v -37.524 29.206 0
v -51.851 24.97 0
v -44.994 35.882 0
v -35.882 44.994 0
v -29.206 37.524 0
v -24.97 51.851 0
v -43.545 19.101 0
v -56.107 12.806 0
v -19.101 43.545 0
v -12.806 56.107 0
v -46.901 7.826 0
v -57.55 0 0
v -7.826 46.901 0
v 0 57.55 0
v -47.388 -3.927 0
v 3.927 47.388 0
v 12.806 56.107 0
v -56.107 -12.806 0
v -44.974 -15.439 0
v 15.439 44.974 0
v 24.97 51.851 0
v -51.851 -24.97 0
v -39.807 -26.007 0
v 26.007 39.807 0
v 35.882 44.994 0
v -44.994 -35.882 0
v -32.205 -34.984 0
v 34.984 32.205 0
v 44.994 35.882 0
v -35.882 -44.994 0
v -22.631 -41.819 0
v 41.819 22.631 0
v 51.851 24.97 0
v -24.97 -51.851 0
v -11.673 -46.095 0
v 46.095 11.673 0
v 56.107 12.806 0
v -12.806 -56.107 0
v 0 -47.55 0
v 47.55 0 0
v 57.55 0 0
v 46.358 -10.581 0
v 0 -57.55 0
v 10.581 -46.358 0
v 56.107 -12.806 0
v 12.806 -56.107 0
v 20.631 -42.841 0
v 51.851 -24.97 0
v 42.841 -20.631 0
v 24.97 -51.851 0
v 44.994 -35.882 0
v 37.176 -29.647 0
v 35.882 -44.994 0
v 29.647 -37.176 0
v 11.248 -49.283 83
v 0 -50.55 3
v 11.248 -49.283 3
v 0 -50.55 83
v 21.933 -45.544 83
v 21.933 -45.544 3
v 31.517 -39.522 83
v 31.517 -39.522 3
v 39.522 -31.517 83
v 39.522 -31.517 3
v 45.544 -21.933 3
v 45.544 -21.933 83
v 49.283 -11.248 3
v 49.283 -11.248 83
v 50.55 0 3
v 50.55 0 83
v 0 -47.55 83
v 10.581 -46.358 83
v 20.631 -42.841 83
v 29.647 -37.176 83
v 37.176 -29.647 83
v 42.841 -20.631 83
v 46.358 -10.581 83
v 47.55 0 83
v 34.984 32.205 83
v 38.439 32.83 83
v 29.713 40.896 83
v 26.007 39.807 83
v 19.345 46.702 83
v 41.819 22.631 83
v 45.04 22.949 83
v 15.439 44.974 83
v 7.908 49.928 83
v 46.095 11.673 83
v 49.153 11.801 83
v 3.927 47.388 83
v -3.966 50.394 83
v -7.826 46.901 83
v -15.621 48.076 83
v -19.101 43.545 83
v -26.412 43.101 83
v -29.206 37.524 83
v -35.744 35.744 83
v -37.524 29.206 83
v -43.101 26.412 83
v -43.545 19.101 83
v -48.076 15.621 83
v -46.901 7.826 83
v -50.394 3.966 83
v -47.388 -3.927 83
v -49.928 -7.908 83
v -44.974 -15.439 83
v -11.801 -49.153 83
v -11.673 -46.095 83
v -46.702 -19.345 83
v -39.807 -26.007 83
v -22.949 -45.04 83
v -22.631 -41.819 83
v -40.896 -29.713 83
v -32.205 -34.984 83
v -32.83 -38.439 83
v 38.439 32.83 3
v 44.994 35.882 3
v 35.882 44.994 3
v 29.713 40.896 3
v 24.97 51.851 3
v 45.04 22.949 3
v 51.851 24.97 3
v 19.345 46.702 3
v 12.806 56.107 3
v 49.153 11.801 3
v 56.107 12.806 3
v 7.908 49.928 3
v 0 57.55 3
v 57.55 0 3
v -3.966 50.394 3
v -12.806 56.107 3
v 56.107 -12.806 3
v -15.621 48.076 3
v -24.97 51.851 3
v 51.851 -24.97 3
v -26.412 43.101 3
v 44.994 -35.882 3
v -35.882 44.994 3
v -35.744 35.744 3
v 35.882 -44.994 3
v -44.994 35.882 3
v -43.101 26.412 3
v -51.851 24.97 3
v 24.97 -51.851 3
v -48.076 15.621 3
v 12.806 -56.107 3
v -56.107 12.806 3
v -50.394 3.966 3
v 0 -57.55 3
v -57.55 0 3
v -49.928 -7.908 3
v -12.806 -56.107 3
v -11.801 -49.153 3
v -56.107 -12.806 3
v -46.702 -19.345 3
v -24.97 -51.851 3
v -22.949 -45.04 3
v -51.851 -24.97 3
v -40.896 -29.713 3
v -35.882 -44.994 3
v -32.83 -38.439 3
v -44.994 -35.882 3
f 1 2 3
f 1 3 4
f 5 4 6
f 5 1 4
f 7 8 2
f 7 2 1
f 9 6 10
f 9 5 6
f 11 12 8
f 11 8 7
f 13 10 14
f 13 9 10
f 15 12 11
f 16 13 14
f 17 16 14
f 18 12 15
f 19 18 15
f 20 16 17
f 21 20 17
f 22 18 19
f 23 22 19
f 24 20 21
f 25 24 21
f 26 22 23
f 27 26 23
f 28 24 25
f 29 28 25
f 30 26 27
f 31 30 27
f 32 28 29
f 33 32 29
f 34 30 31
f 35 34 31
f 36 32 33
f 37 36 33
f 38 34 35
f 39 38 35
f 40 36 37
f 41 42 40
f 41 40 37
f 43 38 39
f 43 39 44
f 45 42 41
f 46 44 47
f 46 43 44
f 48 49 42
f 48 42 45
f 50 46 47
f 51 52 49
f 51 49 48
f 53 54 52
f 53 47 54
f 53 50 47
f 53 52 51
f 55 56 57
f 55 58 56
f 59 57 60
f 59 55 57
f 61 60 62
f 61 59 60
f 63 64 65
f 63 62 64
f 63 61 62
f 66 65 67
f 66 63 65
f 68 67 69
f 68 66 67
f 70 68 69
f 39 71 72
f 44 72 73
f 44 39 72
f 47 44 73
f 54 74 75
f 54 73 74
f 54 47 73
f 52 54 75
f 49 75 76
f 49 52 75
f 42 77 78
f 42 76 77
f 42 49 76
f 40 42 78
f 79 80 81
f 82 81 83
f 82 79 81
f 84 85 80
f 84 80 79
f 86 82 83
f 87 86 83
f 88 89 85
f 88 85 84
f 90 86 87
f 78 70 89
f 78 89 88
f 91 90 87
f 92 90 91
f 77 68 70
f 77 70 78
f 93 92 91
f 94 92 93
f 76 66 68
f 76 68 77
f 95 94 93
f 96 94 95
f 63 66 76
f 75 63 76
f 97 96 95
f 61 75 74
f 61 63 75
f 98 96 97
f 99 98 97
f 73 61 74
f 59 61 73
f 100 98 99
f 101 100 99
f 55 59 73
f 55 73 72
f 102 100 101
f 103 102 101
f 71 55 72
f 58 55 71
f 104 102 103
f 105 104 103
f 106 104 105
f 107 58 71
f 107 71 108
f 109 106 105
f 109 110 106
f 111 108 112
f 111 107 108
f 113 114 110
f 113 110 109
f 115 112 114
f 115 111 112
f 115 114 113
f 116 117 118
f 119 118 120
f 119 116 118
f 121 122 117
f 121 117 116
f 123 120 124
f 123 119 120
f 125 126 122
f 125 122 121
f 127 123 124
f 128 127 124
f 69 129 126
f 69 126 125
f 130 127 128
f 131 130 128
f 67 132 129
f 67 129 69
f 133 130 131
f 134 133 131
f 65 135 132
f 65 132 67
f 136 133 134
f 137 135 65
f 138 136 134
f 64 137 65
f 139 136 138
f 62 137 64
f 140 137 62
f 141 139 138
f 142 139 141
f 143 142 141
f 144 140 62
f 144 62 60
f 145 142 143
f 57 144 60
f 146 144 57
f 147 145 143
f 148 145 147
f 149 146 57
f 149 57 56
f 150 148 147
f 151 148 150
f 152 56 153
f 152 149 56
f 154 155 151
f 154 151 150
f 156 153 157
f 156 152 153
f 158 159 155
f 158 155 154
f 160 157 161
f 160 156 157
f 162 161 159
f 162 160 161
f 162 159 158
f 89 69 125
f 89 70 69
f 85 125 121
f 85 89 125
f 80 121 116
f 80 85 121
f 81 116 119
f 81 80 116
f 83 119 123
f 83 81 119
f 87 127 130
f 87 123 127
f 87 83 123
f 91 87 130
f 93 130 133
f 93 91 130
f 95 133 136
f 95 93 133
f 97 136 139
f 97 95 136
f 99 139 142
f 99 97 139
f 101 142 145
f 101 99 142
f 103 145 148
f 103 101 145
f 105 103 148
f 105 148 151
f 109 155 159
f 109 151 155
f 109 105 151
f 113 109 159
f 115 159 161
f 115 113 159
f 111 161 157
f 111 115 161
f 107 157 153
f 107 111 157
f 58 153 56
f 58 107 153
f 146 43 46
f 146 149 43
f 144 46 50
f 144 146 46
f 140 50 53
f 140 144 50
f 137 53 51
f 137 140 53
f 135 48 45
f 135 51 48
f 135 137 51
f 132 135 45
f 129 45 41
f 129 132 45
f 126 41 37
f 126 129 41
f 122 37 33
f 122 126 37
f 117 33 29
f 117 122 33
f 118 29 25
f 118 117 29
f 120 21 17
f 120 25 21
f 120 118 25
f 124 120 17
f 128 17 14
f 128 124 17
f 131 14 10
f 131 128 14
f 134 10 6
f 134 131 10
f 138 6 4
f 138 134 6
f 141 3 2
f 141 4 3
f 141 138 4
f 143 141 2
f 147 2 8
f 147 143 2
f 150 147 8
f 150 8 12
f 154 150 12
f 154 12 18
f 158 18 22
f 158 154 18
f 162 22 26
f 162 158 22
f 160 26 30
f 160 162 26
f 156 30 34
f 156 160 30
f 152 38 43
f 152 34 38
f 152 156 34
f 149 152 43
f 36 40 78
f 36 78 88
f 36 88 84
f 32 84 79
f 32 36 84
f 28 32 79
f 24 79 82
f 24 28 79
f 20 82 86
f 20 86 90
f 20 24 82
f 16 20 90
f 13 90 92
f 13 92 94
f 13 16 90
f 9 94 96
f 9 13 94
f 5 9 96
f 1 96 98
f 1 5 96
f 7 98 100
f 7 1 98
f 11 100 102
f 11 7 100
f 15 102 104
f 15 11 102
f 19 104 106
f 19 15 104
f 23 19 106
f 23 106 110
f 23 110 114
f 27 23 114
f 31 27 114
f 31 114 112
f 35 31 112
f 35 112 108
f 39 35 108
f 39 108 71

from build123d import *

# Parameters (mm, degrees)
REVOLUTION_ANGLE            = 90
REVOLUTION_MIRRORED_2_ANGLE = -90


with BuildPart() as part:
    # Sketch → Revolution (revolve)
    with BuildSketch(Plane.XZ):
        Polygon((47.55, 0), (50.55, 0), (57.55, 0), (57.55, 3), (50.55, 3), (50.55, 83), (47.55, 83), align=None)
    revolution = revolve(axis=Axis((0, 0, 0), (0, 0, 1)), revolution_arc=REVOLUTION_ANGLE)

    # Sketch Mirrored 2 → Revolution Mirrored 2 (revolve)
    with BuildSketch(Plane(origin=(0, 0, 0), x_dir=(-1, 0, 0), z_dir=(0, 1, 0))):
        Polygon((47.55, 0), (50.55, 0), (57.55, 0), (57.55, 3), (50.55, 3), (50.55, 83), (47.55, 83), align=None)
    revolution_mirrored_2 = revolve(axis=Axis((0, 0, 0), (0, 0, 1)), revolution_arc=REVOLUTION_MIRRORED_2_ANGLE)

    # Mirrored001: Revolution, Revolution Mirrored 2 across Sketch001 H_Axis
    add(revolution.mirror(Plane.ZX))
    add(revolution_mirrored_2.mirror(Plane.ZX))


solid = part.part
